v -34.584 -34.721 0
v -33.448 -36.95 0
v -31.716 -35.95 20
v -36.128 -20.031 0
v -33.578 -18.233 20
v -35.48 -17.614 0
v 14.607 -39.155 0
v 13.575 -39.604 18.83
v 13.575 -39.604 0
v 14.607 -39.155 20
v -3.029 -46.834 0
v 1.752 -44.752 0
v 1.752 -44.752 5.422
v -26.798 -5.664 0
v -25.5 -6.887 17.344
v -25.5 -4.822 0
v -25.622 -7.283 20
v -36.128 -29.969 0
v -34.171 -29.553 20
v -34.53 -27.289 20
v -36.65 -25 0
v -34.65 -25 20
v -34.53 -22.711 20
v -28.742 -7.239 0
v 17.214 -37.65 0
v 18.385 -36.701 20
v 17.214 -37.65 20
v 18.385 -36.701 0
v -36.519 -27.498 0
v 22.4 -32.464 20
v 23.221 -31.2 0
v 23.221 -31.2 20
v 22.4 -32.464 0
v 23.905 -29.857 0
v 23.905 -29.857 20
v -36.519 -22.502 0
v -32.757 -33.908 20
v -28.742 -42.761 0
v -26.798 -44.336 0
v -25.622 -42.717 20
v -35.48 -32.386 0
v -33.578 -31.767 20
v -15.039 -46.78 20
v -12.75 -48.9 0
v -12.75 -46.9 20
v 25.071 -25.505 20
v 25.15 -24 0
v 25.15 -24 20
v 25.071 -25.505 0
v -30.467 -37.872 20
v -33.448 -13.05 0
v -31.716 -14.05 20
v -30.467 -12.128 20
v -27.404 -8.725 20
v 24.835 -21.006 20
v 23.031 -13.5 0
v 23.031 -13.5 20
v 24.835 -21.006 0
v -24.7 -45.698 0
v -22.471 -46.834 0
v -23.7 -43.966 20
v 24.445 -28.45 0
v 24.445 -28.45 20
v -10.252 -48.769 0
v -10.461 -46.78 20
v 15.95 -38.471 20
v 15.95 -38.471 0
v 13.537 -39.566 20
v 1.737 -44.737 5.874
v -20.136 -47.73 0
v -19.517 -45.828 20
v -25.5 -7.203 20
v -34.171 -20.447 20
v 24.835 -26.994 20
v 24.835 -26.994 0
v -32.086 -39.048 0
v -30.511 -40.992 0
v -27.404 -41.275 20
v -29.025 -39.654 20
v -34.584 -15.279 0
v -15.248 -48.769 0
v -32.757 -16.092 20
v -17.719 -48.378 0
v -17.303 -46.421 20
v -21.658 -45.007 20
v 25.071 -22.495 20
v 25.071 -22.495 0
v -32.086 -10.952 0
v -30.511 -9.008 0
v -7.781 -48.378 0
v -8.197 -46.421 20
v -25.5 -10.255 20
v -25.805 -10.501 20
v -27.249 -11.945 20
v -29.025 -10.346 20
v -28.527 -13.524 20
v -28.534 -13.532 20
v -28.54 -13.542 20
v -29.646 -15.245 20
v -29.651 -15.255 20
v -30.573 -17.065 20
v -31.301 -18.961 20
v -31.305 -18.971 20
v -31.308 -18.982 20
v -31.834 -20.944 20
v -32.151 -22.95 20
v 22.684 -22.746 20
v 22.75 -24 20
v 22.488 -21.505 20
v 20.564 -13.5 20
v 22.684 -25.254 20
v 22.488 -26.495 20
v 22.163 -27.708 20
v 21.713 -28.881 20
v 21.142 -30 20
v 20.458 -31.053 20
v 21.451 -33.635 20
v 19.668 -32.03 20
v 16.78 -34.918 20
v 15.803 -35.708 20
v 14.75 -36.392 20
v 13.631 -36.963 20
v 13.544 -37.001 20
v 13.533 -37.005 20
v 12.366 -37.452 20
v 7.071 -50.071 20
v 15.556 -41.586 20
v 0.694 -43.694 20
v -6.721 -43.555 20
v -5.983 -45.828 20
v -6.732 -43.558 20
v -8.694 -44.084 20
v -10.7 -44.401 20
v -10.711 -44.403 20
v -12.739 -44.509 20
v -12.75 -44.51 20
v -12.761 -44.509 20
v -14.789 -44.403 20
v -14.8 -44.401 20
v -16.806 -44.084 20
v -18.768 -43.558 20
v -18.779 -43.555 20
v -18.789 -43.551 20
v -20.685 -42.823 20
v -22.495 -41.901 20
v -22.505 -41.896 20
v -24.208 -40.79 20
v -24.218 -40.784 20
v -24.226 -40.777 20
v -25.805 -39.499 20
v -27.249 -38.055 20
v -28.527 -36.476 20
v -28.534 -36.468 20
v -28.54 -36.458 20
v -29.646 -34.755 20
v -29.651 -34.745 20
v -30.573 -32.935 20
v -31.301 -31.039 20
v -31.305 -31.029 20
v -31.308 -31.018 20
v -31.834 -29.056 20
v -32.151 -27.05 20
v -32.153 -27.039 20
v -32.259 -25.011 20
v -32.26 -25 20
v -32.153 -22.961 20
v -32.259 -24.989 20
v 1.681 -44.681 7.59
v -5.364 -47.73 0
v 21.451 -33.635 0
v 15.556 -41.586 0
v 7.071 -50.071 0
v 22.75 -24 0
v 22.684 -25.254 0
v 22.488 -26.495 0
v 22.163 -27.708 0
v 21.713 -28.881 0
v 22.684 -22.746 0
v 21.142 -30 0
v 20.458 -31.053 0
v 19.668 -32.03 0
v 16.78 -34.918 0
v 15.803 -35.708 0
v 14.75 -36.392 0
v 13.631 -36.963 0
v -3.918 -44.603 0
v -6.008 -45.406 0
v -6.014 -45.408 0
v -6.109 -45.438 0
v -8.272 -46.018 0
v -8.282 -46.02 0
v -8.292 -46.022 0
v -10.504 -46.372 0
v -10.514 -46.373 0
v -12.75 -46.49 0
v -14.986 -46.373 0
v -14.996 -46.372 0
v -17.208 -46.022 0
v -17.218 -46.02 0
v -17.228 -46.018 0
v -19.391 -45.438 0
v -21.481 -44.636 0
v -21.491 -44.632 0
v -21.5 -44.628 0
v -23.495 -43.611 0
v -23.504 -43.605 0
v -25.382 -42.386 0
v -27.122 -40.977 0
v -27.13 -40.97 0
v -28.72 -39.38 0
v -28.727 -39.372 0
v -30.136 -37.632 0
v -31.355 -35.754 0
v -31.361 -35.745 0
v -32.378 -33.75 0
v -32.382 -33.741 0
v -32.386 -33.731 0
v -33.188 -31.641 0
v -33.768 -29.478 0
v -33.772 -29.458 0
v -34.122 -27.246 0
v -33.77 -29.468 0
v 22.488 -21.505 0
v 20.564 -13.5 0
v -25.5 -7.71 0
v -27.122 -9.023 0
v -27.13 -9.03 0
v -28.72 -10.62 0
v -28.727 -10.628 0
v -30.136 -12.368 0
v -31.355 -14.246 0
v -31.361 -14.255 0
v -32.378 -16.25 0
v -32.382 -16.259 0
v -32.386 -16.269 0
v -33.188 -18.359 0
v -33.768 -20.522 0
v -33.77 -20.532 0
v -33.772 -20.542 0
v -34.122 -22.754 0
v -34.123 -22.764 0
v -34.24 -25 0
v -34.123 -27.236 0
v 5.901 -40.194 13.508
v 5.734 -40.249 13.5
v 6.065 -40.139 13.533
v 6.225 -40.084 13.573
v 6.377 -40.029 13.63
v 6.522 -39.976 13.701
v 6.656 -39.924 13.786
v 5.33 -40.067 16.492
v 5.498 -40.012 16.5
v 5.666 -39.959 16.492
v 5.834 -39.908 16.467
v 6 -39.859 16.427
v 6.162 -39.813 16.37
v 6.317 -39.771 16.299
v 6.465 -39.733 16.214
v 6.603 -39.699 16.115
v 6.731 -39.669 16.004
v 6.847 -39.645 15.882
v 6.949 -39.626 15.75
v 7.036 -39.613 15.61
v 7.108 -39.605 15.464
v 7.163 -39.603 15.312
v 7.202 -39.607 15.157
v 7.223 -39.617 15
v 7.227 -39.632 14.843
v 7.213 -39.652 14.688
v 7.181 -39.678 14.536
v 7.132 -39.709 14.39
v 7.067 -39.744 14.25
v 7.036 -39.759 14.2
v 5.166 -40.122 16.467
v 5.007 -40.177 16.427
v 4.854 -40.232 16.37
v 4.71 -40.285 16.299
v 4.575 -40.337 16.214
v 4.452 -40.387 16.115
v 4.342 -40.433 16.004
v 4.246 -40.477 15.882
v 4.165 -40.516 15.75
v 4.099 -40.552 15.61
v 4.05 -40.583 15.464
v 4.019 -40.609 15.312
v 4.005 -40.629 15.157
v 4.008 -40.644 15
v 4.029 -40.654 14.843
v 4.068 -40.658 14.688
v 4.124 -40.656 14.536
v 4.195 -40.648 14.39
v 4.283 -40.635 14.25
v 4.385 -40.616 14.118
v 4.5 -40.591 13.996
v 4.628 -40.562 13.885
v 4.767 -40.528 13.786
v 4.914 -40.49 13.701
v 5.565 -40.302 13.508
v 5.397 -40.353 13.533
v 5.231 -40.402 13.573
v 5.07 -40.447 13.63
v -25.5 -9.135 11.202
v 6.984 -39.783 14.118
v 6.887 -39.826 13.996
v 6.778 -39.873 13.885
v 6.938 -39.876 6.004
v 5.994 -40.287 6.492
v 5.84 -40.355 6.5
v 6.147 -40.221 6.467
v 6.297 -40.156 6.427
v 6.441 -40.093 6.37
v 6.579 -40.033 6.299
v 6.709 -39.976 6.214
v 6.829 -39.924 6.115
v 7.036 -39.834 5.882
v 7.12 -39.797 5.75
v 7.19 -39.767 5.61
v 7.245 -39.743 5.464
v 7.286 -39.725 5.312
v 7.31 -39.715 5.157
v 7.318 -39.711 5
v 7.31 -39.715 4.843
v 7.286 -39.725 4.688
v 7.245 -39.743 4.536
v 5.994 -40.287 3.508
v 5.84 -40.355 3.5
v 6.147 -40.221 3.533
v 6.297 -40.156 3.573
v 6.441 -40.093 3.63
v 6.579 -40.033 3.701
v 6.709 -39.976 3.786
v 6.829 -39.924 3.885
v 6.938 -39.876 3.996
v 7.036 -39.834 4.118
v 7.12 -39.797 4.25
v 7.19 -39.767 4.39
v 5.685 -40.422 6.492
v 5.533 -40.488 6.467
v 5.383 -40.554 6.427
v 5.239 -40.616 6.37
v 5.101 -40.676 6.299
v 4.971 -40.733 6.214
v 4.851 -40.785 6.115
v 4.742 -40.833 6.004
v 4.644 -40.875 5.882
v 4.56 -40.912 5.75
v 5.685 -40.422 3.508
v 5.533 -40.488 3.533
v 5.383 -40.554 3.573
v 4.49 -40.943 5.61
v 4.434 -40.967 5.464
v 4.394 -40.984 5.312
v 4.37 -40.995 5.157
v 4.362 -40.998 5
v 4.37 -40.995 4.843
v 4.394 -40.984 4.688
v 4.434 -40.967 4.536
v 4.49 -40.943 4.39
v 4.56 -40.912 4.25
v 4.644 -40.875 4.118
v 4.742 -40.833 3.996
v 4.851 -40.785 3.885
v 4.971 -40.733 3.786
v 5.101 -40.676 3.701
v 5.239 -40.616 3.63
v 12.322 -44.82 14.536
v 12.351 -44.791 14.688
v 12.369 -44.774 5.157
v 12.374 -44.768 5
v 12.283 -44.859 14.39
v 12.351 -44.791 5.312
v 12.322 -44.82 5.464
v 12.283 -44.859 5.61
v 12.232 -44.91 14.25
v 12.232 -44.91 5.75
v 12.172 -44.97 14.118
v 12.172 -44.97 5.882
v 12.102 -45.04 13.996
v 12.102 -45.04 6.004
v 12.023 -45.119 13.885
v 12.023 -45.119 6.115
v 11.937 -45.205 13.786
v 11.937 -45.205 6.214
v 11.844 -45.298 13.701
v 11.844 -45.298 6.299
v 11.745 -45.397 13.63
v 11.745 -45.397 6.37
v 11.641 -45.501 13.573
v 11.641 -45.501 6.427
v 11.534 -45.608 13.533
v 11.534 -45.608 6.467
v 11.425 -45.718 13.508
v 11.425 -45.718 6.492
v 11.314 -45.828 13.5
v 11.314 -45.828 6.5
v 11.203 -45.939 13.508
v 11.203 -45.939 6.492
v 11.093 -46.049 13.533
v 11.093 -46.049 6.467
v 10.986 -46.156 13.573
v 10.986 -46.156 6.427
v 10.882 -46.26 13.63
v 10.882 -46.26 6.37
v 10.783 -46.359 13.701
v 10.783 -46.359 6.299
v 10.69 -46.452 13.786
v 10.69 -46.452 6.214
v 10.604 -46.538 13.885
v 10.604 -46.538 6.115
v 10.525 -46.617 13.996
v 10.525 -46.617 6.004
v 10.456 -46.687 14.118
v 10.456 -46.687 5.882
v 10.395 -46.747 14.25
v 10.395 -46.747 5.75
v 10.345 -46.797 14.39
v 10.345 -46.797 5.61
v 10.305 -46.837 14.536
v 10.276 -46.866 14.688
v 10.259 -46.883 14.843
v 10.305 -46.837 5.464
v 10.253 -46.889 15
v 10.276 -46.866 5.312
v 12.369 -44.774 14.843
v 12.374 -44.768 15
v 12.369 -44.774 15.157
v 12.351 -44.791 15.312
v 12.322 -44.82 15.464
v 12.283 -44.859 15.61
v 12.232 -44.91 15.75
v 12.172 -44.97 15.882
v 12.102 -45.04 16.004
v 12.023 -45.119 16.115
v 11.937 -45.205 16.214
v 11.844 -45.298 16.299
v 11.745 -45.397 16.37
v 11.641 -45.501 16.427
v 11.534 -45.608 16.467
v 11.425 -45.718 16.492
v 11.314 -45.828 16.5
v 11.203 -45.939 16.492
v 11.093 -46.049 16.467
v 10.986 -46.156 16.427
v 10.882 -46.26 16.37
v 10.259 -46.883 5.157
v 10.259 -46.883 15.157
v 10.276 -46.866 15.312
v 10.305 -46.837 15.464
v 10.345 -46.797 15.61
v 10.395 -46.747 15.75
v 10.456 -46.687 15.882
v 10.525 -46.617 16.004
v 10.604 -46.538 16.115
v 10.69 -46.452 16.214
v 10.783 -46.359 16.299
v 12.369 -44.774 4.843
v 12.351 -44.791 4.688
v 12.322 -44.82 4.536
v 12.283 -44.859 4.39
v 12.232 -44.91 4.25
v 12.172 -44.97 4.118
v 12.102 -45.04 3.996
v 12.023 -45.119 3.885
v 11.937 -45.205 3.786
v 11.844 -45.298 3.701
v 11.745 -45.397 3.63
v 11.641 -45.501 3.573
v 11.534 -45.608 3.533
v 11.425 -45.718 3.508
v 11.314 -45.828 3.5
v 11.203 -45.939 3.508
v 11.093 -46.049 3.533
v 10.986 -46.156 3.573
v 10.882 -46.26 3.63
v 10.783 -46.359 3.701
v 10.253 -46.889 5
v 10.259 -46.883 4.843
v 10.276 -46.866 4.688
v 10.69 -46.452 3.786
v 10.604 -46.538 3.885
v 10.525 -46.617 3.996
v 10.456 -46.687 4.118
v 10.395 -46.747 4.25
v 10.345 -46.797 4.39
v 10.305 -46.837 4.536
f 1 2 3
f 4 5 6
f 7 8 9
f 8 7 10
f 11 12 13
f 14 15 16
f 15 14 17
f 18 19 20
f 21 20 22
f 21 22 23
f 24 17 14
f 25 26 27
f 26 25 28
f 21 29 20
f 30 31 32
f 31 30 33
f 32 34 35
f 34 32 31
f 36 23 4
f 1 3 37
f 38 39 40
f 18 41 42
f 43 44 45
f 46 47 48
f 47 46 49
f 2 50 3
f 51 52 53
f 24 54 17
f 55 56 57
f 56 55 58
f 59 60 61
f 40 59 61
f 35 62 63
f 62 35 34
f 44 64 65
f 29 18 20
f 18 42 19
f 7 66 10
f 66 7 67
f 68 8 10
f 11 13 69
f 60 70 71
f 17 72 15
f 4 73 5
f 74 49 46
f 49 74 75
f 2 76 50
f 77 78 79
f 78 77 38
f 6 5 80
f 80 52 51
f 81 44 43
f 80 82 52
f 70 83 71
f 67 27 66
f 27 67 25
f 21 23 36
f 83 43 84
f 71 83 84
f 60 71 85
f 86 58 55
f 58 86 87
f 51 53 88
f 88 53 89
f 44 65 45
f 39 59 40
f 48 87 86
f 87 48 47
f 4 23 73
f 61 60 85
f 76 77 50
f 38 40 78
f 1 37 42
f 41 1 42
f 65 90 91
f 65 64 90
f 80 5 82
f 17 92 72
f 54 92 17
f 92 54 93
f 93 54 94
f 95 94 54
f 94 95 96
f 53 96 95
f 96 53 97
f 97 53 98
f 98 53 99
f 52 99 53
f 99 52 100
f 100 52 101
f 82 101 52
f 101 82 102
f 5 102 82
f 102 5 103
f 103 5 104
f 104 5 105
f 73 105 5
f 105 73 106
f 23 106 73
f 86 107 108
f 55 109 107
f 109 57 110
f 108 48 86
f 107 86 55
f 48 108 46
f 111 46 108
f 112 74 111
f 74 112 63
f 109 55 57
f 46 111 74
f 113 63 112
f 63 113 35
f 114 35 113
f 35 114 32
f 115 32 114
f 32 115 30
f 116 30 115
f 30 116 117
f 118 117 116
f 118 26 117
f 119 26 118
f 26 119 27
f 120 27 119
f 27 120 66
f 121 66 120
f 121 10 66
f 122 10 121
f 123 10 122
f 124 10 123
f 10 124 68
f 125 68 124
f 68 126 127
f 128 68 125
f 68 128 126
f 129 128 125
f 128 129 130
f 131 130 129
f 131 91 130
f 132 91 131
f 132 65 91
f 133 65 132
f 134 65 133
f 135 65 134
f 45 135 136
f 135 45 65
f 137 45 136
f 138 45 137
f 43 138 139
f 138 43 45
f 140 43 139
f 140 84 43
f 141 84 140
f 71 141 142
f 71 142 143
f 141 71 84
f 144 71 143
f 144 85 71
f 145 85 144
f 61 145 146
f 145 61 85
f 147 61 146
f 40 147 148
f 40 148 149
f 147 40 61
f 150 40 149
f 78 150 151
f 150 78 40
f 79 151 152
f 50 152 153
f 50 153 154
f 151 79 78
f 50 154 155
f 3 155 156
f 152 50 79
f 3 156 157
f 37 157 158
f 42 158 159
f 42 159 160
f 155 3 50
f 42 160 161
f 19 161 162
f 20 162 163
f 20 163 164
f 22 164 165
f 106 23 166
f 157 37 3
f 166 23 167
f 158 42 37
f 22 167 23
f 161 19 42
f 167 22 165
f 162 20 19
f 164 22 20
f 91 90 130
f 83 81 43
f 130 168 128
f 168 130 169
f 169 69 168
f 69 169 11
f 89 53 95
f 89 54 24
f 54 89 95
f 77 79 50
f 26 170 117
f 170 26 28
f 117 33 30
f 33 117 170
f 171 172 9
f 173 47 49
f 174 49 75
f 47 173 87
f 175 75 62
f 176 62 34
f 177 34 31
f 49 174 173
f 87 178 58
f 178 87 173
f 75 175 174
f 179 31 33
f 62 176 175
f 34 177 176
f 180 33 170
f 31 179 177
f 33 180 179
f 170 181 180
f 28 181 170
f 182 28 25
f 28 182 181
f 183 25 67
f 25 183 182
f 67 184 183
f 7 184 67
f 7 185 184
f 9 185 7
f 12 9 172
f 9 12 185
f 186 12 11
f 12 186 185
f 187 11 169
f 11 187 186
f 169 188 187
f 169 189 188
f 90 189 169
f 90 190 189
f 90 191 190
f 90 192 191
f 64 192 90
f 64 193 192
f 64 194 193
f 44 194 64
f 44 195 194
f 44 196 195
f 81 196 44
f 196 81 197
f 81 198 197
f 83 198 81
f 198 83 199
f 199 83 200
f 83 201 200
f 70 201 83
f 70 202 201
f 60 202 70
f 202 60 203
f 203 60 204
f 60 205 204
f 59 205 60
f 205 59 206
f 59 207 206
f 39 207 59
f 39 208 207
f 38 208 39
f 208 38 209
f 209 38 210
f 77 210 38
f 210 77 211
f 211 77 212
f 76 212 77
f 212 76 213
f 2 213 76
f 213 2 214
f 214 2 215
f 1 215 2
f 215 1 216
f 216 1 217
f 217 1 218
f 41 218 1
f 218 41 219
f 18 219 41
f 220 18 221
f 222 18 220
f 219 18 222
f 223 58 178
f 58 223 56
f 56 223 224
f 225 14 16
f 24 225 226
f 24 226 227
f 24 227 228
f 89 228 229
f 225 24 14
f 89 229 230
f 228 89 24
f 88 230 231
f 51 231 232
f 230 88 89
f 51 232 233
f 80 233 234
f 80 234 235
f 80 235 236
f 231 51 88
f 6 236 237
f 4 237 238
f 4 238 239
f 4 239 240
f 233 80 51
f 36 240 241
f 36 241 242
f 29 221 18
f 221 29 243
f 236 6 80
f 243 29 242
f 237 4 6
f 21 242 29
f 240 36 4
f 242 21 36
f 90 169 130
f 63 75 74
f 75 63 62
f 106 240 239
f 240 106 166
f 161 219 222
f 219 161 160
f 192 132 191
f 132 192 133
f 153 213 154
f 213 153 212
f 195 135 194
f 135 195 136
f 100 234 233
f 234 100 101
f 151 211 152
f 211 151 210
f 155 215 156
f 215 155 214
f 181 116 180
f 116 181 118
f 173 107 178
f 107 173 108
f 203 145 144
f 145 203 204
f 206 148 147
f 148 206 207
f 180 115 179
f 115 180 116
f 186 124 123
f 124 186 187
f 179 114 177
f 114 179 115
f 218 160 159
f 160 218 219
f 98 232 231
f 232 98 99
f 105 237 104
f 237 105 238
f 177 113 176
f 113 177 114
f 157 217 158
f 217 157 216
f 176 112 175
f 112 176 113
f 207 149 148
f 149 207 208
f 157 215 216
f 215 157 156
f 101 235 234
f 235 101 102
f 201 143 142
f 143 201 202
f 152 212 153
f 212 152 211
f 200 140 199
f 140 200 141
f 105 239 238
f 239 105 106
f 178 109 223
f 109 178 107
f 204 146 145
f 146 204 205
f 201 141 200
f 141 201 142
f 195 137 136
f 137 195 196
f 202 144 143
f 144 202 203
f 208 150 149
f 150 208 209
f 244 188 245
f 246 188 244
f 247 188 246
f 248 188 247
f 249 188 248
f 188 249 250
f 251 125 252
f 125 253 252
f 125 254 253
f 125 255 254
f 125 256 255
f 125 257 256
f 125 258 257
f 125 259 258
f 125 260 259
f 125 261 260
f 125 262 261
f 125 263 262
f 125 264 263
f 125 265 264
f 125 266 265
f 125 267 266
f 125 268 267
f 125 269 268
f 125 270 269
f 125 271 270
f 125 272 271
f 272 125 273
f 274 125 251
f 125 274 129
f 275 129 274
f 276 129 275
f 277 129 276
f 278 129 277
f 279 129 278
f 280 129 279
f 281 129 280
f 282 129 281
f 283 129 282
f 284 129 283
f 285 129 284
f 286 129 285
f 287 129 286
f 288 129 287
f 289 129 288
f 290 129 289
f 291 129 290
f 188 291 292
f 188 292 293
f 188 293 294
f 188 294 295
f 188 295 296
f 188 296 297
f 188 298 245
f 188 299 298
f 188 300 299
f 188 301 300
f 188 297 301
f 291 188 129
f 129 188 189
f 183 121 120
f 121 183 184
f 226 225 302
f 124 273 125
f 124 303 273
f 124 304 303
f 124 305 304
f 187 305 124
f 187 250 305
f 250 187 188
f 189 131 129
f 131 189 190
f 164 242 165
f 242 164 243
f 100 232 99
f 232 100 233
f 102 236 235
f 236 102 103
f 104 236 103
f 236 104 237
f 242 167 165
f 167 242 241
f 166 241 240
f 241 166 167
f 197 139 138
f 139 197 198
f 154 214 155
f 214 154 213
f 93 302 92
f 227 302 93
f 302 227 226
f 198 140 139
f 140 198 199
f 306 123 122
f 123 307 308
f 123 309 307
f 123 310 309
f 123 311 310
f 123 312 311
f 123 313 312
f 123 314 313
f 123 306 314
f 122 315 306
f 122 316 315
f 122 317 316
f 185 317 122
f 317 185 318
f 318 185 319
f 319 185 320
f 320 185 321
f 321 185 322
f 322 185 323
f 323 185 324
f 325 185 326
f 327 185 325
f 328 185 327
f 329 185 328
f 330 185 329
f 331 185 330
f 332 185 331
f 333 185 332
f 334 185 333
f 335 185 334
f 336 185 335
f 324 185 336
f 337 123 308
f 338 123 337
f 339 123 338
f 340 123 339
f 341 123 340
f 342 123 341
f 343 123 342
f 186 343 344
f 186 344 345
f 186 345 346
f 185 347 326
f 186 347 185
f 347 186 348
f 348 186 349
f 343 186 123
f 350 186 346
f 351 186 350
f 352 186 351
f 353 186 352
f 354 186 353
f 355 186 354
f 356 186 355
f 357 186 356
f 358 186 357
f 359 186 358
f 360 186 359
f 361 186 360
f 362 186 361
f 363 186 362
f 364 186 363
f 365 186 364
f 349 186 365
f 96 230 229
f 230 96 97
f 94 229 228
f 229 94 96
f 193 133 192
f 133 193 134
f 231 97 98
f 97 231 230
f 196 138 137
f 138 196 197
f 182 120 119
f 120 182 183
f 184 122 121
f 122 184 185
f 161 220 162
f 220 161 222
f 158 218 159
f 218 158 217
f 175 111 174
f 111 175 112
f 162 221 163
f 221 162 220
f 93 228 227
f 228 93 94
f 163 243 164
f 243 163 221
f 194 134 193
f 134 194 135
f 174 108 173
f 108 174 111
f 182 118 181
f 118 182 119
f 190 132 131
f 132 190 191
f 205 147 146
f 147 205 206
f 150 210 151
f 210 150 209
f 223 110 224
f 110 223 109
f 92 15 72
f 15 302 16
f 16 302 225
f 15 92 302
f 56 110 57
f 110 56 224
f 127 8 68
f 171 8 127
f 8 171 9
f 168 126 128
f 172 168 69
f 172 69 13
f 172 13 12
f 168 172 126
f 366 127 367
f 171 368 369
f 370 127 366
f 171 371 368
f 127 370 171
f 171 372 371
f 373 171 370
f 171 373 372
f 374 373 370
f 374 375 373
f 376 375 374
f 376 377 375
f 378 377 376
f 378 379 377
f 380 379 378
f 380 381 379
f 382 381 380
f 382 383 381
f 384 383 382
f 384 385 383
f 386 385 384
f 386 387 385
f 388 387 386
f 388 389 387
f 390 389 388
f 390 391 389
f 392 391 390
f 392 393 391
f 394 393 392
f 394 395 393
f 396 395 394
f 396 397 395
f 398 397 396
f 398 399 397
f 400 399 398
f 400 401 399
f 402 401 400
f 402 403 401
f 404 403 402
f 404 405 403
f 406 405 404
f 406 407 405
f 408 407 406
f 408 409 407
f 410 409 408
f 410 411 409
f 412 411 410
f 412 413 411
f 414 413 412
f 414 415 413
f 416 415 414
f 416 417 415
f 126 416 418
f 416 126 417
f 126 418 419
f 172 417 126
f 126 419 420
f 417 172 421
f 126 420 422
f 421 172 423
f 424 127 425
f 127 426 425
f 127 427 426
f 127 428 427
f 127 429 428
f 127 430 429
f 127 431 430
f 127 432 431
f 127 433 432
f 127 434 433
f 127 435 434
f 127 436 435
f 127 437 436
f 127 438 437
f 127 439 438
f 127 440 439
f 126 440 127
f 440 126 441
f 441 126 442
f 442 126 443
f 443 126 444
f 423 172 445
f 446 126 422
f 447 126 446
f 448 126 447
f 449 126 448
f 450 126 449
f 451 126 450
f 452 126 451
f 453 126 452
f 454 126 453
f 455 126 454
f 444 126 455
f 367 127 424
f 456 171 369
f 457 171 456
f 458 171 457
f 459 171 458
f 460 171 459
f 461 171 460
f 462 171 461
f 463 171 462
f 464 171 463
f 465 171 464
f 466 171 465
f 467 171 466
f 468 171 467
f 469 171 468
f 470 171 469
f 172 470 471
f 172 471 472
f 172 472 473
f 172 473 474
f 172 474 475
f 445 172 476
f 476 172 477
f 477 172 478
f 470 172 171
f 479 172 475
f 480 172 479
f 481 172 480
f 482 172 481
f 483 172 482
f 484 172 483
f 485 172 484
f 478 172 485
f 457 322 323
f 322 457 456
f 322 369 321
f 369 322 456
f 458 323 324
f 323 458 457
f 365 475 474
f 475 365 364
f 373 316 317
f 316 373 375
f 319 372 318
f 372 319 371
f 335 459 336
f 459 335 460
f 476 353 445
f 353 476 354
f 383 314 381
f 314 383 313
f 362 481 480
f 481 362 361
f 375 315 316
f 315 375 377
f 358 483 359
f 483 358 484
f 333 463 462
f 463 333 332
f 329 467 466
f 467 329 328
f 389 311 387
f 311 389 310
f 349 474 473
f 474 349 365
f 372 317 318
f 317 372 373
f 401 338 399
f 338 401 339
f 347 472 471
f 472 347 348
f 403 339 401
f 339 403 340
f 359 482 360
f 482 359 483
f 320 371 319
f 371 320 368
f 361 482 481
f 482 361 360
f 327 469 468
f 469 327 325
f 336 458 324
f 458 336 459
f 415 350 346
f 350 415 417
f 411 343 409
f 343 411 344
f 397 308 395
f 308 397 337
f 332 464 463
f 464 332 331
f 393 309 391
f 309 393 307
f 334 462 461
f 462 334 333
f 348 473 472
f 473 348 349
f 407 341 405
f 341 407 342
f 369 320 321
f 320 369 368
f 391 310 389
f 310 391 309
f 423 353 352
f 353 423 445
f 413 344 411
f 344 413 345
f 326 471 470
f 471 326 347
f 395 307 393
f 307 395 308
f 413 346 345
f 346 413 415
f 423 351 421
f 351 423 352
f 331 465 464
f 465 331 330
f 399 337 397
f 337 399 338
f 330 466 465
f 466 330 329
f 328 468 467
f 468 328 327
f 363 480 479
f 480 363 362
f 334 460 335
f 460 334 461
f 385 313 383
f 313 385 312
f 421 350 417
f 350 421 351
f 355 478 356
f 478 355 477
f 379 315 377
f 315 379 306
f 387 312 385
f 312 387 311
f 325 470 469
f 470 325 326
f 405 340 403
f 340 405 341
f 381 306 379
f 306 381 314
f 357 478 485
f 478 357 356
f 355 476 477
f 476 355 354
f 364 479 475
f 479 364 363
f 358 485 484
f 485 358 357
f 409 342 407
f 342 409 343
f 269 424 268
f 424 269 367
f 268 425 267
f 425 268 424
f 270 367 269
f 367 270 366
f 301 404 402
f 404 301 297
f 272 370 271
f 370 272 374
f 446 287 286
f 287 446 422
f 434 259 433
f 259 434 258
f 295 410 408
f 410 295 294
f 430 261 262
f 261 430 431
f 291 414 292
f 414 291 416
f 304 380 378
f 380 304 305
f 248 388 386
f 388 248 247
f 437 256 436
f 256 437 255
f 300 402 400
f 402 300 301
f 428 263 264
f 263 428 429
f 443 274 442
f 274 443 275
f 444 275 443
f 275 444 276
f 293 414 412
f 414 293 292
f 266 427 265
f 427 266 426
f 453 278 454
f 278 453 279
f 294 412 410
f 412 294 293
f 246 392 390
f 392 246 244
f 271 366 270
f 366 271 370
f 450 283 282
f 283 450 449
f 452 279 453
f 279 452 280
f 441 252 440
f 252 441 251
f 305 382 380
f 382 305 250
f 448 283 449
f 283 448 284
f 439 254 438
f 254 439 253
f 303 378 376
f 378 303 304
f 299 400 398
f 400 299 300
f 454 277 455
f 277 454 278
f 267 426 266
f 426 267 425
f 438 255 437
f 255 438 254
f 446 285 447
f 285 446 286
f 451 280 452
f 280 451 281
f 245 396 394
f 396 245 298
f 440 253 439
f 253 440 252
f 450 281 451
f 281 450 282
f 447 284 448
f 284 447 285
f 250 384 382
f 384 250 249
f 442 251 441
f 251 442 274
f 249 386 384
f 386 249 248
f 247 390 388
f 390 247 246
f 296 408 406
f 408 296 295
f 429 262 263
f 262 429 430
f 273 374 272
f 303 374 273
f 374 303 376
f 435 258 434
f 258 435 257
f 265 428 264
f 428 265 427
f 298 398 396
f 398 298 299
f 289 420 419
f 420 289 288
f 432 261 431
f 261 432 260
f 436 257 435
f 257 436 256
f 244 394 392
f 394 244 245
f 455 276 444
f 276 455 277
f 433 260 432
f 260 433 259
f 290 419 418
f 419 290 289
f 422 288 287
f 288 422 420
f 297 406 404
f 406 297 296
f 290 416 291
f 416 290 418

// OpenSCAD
$fn=60;

// tuned for Celestron Cometron 7x50 binoculars
// https://www.amazon.com/gp/product/B00DV6SI3Q/ref=oh_aui_search_detailpage?ie=UTF8&psc=1
major_r1=19.5;
major_r2=21.5;
minor_r=12;
center_dist=major_r1+minor_r-6;

// six passes with 0.4 nozzle
wall=2.4;
h=20;

theta=atan((major_r1-minor_r)/center_dist);

module cuff(){
    difference(){
        hull(){
            translate([-center_dist/2,0,0])
                cylinder(r2=major_r1+wall, r1=major_r2+wall,h=h);
            
            translate([center_dist/2-4,1,0])
                cylinder(r=minor_r+wall,h=h);
            
            translate([center_dist/2-2,-1,0])
                cylinder(r=minor_r+wall,h=h);
            
            translate([center_dist/2-9,-major_r1/4-6,0])
                cylinder(r=major_r1+wall-3,h=h);
        }
        
        hull(){
            translate([-center_dist/2,0,-0.1])
                cylinder(r2=major_r1,r1=major_r2,h=h+0.2);
            
            translate([center_dist/2-4,1,-0.1])
                cylinder(r=minor_r,h=h+0.2);
            
            translate([center_dist/2-2,-1,-0.1])
                cylinder(r=minor_r,h=h+0.2);
            
            translate([center_dist/2-9,-major_r1/4-6,-0.1])
                cylinder(r=major_r1-3,h=h+0.2);
        }
        
        translate([-center_dist,-2*major_r1,-0.1])
            cube([major_r1+minor_r+center_dist+2*wall+0.1,
                  major_r1+8,
                  h+0.2]);
    }
}

block_w=12;
block_h=10;
bolt_d=3;

hole_zs=[5, 15];

module block(){
    difference(){
        cube([block_w,block_h,h]);
        translate([0,-1.1*block_h,-0.1])
        rotate([0,0,28])
            cube([2*block_w,block_h,h+0.2]);
    }
}

module block_holes(){
    for(z=hole_zs){
        translate([block_w/2,-0.1,z])
        rotate([-90,0,0])
            cylinder(d=bolt_d,h=block_h+0.2);
    }
}

// One is right-hand side, other is left-hand side.
// I can't remember which is which...
module assy(){
    translate([0,25,0])
    difference(){
        union(){
            cuff();
            translate([0,18,0])
            rotate([0,0,-45])
                block();
        }
        
        // Angling this makes adjoining panel parallel to top of binocs
        translate([0,18,0])
        rotate([0,0,-45])
            block_holes();
    }
}

// One is right-hand side, other is left-hand side.
// I can't remember which is which...
module mirrorOfAssy(){
    mirror([0,1,0])
      assy();
}

// Plate for adding wiring / LEDs / buttons
module button_plate(){
    f=2;
    difference(){
        union(){
            translate([0,-h, 0])
            hull(){
                for(x=[f,2*h-f],
                    y=[f,2*h-f]){
                    translate([x,y,0])
                        cylinder(r=f, h=wall);
                }
            }
            
            translate([h,0,wall])
            hull(){
                translate([0,2,0])
                    cylinder(d=4,h=block_h-wall/2-0.5);
                translate([0,h-2,0])
                    cylinder(d=4,h=block_h-wall/2+1.25);
            }
        }
        
        translate([26.5,h,-wall/2])
        rotate([90,0,0])
            block_holes();
    }
}

//button_plate();
//assy();
mirrorOfAssy();
